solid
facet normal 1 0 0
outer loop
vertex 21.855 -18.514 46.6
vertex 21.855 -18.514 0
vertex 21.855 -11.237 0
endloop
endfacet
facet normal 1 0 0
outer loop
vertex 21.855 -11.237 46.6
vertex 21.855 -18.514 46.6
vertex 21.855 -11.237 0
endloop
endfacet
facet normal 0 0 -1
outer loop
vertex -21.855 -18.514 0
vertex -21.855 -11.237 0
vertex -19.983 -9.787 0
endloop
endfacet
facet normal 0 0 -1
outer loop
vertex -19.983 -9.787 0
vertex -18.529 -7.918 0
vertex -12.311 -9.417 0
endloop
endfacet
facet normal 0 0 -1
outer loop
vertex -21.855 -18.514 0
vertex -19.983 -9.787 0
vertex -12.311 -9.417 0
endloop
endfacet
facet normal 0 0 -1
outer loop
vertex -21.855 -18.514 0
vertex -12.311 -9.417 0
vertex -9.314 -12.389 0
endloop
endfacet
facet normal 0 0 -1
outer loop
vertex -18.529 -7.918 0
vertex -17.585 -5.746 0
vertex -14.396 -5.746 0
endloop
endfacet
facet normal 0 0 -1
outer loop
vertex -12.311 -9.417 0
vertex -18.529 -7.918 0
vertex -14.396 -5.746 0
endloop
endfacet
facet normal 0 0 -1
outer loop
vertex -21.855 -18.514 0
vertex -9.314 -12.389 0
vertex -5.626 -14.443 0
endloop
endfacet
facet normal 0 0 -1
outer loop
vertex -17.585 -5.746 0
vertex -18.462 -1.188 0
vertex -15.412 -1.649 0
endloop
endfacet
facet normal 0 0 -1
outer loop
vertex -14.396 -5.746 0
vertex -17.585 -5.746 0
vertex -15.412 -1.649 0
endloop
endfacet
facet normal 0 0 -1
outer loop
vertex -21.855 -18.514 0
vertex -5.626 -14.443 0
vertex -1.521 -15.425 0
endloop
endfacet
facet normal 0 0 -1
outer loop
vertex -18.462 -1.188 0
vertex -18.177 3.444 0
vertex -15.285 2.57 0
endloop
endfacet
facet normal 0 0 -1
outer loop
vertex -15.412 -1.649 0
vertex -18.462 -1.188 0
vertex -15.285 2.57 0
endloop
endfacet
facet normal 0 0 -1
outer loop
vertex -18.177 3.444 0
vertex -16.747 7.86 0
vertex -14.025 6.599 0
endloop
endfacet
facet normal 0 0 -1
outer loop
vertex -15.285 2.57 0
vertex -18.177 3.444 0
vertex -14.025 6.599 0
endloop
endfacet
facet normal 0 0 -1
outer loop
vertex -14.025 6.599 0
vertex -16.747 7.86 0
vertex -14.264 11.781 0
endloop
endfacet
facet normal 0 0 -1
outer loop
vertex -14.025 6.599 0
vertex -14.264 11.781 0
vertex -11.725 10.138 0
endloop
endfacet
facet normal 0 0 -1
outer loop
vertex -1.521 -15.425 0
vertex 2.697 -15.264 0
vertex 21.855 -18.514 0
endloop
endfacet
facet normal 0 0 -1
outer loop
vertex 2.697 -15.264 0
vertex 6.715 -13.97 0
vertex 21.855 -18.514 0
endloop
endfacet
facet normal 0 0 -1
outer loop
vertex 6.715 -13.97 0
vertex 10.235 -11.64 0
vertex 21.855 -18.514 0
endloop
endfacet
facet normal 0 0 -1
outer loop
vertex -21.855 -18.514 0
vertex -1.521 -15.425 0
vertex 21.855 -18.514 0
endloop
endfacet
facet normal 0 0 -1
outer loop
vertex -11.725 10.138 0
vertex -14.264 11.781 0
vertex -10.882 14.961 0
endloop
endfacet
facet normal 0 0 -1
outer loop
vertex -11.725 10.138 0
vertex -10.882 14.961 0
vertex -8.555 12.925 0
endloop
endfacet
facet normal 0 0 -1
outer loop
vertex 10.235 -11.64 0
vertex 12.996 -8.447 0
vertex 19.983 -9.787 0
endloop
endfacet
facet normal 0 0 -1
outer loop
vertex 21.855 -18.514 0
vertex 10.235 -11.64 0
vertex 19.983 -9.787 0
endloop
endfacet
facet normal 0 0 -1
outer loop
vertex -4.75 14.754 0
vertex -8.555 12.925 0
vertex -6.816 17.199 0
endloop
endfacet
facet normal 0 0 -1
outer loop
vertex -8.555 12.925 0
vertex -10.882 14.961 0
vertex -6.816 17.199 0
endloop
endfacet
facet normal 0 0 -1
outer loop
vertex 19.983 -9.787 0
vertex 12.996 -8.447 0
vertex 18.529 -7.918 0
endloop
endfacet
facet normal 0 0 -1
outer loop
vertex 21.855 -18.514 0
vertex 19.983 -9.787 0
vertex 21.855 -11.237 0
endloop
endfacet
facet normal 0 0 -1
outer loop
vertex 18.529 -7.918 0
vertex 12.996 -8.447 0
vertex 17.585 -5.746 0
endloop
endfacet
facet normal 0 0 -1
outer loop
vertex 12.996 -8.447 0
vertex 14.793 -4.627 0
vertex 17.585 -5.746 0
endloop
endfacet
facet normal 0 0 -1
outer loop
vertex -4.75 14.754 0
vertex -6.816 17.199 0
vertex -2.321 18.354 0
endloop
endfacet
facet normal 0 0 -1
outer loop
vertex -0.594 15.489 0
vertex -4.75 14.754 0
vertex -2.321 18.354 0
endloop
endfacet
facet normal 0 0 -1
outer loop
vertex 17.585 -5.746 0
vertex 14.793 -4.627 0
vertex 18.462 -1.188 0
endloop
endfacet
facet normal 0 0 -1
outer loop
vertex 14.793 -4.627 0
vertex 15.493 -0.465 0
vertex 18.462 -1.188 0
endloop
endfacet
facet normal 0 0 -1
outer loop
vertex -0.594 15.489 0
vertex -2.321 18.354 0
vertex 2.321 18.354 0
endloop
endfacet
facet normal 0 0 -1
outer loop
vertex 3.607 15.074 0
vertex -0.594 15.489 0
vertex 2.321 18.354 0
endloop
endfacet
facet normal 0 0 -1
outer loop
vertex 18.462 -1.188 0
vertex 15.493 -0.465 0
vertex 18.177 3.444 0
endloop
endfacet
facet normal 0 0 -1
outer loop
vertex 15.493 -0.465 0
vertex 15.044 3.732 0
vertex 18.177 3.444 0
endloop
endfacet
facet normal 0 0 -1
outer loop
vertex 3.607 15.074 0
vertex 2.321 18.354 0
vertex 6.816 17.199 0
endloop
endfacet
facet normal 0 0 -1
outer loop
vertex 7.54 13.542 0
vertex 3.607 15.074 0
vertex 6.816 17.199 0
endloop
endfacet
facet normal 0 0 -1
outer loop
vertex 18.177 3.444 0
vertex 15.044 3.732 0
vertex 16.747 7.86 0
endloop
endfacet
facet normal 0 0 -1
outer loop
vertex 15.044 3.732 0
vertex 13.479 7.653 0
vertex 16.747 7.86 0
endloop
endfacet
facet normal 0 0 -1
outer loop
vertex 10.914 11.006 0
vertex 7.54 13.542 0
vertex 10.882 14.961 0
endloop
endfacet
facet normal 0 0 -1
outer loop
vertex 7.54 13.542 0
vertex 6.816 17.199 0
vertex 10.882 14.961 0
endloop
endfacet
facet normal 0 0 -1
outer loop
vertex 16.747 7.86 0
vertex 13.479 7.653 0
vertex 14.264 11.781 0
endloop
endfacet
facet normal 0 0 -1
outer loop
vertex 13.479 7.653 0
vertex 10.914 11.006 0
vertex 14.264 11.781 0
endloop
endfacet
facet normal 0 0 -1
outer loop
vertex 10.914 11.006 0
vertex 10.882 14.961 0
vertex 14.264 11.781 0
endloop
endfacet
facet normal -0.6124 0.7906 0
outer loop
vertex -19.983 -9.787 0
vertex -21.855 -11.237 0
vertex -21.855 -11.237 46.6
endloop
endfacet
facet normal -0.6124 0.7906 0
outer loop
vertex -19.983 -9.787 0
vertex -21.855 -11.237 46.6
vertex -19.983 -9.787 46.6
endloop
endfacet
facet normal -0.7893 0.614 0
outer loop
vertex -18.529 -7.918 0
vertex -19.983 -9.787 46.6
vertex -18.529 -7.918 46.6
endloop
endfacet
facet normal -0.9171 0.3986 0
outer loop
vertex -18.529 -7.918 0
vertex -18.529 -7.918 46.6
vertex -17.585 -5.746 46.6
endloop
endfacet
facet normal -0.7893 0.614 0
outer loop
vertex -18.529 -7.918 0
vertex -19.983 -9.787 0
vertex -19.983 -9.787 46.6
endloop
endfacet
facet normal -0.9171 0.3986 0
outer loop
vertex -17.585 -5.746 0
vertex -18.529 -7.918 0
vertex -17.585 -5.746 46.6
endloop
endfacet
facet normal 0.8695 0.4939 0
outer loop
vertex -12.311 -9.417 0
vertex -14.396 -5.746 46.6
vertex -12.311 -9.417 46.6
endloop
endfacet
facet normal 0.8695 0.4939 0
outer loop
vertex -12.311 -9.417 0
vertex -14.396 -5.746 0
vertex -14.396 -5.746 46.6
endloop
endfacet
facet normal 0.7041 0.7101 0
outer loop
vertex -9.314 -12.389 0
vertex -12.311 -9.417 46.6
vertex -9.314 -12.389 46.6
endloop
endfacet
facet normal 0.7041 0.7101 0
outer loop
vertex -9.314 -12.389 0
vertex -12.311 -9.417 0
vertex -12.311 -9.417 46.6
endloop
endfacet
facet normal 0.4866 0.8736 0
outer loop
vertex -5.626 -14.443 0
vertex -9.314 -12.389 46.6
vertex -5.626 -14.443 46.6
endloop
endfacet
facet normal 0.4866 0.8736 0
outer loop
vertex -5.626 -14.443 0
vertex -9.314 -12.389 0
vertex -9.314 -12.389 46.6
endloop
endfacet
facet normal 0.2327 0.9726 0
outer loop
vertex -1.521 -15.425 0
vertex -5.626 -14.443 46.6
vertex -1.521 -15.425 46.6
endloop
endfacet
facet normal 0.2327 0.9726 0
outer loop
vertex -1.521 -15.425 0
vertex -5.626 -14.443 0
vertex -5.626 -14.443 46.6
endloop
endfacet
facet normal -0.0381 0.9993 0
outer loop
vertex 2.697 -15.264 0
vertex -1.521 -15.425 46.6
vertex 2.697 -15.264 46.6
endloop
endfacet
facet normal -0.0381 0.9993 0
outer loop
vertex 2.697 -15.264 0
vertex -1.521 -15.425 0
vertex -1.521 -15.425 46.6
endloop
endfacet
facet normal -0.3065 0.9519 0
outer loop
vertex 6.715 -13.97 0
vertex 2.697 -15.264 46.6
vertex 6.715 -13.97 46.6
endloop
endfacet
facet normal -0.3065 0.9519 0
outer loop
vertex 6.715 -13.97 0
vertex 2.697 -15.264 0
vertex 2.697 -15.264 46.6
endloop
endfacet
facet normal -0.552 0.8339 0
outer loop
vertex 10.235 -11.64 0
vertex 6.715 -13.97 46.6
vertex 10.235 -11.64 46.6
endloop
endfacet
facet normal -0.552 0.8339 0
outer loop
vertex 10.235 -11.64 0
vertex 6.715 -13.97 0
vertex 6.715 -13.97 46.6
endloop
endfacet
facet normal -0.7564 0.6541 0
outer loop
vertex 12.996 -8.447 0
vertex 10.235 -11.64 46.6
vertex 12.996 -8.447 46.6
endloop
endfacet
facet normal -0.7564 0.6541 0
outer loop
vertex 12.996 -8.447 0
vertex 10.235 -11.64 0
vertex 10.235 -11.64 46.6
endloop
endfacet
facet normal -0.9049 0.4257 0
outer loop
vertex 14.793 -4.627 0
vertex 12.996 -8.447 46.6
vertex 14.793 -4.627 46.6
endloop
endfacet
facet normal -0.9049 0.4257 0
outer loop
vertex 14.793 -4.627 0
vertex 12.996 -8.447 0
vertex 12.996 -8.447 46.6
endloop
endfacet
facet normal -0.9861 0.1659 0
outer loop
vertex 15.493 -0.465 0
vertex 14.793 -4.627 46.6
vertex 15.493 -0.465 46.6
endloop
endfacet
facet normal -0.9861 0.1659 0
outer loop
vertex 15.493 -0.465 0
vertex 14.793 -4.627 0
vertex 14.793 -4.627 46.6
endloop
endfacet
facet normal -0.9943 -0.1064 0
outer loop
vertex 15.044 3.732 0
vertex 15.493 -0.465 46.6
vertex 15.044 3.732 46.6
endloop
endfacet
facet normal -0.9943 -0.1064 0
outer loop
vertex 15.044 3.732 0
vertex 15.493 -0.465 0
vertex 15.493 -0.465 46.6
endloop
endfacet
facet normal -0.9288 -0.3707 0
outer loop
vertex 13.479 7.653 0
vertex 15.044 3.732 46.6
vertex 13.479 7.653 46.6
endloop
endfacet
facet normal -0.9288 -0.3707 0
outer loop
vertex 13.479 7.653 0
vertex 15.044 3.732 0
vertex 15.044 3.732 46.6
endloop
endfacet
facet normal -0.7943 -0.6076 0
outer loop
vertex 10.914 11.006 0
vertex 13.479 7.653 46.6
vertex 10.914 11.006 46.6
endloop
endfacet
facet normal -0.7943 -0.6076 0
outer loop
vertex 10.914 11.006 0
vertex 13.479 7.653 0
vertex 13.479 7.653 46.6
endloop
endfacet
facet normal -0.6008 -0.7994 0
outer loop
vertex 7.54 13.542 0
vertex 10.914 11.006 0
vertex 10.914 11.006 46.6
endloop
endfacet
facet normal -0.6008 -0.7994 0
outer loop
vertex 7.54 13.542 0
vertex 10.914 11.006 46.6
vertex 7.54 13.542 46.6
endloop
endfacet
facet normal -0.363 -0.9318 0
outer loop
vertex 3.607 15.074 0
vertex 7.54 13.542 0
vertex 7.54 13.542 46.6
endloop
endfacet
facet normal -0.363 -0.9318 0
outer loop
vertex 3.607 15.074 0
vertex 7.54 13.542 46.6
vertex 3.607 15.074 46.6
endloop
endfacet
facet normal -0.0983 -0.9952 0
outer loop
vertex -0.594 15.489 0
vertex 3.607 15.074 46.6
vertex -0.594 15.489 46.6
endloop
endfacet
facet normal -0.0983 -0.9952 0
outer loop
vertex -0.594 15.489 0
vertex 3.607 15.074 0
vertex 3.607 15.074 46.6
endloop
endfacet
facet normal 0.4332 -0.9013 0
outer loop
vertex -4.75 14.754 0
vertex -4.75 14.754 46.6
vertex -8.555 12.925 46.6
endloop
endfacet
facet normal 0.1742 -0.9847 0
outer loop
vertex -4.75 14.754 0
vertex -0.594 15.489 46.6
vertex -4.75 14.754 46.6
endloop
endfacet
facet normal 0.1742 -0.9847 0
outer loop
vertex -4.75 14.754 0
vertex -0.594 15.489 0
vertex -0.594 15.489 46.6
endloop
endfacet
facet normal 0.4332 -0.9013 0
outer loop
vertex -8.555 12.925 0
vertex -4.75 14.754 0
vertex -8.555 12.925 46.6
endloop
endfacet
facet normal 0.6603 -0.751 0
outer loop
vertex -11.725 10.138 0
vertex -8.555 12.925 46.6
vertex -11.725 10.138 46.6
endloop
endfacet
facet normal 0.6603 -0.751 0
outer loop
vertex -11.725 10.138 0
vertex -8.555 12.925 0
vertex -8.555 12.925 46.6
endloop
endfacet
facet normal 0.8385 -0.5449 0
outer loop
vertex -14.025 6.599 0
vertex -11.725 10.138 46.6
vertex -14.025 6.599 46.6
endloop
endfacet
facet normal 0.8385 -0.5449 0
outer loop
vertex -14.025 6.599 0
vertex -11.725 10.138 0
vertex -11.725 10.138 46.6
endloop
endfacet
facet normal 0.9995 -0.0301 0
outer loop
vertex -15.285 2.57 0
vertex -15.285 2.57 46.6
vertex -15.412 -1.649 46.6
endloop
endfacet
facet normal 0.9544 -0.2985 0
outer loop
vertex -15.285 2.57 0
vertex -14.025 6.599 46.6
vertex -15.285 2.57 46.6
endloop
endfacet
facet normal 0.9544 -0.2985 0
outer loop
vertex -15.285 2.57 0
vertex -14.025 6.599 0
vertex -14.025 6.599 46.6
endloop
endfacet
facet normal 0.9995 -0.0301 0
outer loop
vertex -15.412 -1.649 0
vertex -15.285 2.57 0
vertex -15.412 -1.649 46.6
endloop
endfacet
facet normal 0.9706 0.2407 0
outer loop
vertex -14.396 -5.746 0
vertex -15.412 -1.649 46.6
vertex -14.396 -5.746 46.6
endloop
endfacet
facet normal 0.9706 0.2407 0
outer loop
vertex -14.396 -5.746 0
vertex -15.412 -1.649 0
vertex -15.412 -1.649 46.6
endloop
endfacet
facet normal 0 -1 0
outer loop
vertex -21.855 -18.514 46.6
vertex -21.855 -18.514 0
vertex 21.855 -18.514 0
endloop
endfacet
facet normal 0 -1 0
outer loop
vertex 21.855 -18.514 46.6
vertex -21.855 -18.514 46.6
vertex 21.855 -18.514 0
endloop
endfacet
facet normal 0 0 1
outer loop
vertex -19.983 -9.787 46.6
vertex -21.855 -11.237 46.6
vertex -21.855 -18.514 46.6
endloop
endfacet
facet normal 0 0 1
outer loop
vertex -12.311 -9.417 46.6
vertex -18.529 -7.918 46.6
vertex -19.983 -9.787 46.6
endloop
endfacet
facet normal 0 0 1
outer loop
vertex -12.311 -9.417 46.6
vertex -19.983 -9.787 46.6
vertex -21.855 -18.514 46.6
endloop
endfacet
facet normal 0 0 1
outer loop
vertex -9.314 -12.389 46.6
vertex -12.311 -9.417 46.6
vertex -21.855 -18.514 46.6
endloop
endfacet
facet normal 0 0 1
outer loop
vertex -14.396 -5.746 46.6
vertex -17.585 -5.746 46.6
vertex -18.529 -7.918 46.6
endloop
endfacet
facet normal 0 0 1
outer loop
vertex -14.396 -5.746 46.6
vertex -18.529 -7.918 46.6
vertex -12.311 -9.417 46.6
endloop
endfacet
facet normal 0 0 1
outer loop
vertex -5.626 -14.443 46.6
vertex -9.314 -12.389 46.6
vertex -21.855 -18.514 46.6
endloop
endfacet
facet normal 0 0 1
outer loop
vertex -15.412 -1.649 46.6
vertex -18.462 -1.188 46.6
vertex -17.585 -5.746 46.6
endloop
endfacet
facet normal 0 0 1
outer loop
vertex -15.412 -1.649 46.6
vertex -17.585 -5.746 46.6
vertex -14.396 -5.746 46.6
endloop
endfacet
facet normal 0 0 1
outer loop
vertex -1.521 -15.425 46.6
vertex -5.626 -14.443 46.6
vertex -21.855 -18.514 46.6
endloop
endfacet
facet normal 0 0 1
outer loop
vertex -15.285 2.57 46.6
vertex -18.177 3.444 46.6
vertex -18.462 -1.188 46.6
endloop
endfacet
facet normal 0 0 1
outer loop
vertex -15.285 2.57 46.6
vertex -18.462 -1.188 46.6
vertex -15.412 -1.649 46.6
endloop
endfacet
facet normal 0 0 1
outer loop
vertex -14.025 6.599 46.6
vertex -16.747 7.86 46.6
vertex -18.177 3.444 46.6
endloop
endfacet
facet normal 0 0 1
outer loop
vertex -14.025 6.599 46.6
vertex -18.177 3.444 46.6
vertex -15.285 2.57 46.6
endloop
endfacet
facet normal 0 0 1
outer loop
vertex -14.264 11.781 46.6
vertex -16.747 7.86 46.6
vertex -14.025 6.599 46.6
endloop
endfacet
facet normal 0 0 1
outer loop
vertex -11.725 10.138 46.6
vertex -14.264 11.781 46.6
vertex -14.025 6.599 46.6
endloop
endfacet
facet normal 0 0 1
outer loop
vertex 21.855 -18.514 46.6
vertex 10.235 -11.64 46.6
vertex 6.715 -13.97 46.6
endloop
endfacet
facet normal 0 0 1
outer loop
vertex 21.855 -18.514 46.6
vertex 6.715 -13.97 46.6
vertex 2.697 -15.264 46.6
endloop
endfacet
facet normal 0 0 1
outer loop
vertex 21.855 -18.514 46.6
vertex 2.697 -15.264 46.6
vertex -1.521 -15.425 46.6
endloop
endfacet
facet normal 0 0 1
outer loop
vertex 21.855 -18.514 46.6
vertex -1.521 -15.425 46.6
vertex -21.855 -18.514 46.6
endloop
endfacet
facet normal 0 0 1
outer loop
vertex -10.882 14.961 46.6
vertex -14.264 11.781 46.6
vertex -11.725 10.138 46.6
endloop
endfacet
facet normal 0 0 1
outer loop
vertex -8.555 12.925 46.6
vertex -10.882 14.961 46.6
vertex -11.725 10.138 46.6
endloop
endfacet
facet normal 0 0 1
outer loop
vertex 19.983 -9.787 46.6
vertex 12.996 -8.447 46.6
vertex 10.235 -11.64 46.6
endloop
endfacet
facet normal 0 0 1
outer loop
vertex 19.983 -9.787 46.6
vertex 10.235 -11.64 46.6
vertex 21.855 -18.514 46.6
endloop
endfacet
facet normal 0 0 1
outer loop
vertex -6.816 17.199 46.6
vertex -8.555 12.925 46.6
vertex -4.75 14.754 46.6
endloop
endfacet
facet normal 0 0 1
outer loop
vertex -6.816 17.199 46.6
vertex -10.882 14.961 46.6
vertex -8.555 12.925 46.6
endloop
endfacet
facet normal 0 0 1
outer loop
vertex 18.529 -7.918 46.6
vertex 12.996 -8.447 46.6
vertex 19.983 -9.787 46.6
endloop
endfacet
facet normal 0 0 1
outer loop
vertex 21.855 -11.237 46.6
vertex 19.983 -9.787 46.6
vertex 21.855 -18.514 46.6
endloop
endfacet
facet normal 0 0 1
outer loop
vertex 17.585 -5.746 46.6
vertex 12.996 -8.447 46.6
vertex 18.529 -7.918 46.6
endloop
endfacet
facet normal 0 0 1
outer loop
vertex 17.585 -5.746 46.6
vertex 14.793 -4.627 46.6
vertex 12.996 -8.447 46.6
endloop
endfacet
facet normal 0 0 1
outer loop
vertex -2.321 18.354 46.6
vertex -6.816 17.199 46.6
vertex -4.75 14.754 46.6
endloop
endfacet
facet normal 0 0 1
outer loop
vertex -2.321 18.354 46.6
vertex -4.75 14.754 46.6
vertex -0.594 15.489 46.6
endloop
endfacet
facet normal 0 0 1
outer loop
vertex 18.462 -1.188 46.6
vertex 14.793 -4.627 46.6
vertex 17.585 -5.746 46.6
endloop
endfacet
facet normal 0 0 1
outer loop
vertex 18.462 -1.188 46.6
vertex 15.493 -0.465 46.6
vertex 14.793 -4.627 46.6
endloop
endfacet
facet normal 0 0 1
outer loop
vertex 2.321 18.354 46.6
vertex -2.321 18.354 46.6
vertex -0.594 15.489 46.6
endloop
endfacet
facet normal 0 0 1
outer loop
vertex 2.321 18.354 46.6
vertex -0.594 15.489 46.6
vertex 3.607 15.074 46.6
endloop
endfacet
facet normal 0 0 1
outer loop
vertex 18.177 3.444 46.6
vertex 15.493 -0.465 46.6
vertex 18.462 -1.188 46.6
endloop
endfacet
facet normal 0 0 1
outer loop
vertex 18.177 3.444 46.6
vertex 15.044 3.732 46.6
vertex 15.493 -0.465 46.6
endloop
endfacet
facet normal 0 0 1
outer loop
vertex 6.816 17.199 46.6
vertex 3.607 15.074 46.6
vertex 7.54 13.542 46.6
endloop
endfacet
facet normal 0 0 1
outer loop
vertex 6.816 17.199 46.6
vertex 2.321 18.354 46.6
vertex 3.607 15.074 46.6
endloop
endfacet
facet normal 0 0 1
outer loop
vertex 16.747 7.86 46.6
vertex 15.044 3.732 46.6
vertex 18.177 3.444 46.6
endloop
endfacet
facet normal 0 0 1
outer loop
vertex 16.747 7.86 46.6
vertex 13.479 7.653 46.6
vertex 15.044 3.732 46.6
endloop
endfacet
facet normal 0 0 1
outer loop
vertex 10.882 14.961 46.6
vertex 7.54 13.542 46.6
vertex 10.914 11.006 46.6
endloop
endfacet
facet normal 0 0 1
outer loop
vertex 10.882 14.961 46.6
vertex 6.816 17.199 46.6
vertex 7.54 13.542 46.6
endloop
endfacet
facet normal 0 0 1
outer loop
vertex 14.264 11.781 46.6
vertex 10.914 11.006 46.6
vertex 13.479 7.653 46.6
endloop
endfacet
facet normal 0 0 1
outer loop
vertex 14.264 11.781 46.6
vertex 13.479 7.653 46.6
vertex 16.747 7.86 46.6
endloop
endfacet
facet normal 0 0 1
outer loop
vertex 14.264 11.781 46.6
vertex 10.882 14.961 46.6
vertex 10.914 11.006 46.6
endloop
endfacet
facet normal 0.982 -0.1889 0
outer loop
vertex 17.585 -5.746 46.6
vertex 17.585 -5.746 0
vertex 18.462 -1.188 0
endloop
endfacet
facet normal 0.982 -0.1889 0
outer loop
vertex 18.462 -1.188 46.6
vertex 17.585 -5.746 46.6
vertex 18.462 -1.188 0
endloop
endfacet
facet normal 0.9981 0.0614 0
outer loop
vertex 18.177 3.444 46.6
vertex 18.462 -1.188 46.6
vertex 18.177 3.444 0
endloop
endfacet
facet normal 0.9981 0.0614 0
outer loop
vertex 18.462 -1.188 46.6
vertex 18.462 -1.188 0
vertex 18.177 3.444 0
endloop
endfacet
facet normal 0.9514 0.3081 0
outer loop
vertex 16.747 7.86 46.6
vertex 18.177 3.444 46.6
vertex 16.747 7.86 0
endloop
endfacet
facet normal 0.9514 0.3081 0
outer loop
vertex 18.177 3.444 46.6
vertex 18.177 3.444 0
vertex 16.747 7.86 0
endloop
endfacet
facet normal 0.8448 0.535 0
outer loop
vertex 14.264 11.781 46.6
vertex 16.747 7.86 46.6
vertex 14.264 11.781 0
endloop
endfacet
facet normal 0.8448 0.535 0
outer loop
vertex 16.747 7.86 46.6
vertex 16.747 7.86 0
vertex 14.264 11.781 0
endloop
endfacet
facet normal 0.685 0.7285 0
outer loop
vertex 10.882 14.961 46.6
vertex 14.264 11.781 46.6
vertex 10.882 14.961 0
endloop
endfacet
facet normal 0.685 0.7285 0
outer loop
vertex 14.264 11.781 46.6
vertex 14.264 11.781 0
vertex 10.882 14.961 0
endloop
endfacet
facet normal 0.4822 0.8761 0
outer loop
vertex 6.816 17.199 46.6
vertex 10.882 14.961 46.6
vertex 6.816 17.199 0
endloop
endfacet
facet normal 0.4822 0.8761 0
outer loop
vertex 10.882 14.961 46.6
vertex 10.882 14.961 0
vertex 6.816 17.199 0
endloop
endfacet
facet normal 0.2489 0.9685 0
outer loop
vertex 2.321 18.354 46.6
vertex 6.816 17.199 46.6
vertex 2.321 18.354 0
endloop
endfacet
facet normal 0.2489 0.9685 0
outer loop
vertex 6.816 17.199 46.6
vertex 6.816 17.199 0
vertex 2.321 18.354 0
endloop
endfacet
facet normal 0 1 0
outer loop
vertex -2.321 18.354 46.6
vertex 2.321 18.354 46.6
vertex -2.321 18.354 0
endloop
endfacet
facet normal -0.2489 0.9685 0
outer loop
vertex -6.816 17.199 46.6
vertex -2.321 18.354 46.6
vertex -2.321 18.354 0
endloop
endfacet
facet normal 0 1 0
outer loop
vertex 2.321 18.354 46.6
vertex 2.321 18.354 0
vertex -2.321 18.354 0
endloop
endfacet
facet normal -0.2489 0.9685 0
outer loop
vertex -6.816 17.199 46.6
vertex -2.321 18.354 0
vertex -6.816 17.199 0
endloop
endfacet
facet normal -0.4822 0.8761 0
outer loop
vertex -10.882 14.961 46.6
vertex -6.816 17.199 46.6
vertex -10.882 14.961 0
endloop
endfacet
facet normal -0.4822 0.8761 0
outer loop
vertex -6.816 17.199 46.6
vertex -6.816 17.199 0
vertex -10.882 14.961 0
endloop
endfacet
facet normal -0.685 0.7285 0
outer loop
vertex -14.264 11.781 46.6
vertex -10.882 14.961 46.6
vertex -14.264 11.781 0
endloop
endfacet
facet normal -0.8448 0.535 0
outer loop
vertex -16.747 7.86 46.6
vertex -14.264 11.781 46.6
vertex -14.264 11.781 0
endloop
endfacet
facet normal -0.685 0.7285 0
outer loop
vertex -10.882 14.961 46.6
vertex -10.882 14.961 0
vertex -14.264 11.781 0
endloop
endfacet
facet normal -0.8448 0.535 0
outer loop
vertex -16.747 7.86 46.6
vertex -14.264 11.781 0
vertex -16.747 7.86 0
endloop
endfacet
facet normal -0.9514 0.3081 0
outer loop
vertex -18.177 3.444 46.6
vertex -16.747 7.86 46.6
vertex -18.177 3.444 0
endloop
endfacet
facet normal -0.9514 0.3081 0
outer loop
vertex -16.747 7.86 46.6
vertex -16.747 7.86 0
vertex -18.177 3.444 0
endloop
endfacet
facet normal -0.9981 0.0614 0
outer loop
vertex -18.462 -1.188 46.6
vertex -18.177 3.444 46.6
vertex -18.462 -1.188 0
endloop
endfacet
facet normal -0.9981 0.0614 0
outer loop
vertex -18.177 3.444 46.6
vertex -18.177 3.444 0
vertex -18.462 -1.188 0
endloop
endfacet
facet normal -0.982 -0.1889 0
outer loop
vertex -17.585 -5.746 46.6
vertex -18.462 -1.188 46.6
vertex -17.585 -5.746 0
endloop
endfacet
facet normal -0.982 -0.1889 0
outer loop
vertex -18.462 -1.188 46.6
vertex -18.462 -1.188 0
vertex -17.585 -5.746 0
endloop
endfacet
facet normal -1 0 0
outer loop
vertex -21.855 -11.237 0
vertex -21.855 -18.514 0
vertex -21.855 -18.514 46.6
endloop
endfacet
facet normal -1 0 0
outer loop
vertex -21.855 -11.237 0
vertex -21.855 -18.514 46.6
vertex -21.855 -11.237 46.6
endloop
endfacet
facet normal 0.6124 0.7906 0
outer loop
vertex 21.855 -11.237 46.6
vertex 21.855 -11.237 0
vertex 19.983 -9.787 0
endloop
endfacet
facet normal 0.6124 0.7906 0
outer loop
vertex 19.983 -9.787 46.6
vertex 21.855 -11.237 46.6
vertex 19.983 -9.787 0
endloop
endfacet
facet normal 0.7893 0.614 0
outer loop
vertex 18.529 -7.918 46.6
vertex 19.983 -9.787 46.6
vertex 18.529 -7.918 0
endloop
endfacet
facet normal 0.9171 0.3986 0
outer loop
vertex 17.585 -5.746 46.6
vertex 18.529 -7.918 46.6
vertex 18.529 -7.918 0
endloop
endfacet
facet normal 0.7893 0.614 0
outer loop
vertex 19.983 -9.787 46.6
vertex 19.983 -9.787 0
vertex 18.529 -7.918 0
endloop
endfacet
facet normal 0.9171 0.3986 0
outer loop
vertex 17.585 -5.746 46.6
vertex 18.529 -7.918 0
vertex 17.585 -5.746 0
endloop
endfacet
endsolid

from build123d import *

# Parameters (mm, degrees)
SKETCH1_R           = 18.5
SKETCH1_R_2         = 15.5
BOSS_EXTRUDE1_DEPTH = 46.6
SKETCH4_W           = 43.709561032
SKETCH4_H           = 12.768078571
BOSS_EXTRUDE2_DEPTH = 46.6
SKETCH5_R           = 15.5
CUT_EXTRUDE1_DEPTH  = 55.698893074
CUT_EXTRUDE4_DEPTH  = 46.6


# Read off the part's stored shape, not the designer's step: Cut-Extrude4
with BuildPart() as part:
    # Sketch1 → Boss-Extrude1 (new body)
    with BuildSketch(Plane.XY):
        Circle(SKETCH1_R)
        Circle(SKETCH1_R_2, mode=Mode.SUBTRACT)
    extrude(amount=BOSS_EXTRUDE1_DEPTH)

    # Sketch4 → Boss-Extrude2 (add, through all)
    with BuildSketch(Plane.XY):
        with Locations((0, -12.13021123)):
            Rectangle(SKETCH4_W, SKETCH4_H)
    extrude(amount=BOSS_EXTRUDE2_DEPTH)

    # Sketch5 → Cut-Extrude1 (cut, through all)
    with BuildSketch(Plane.XY):
        Circle(SKETCH5_R)
    extrude(amount=CUT_EXTRUDE1_DEPTH, mode=Mode.SUBTRACT)

    # Cut-Extrude4 outline → Cut-Extrude4 (cut)
    with BuildSketch(Plane.XY):
        with BuildLine():
            ThreePointArc((-21.854780516, -11.237165736), (-19.197353427, -8.897985946), (-17.584979613, -5.746171944))
            Line((-17.584979613, -5.746171944), (-21.854780516, -5.746171944))
            Line((-21.854780516, -5.746171944), (-21.854780516, -11.237165736))
        make_face()
    cut_extrude4 = extrude(amount=CUT_EXTRUDE4_DEPTH, mode=Mode.SUBTRACT)

    # Mirror2: Cut-Extrude4 across plane
    add(cut_extrude4.mirror(Plane(origin=(0, 0, 0), x_dir=(0, 0, 1), z_dir=(1, 0, 0))), mode=Mode.SUBTRACT)


solid = part.part
